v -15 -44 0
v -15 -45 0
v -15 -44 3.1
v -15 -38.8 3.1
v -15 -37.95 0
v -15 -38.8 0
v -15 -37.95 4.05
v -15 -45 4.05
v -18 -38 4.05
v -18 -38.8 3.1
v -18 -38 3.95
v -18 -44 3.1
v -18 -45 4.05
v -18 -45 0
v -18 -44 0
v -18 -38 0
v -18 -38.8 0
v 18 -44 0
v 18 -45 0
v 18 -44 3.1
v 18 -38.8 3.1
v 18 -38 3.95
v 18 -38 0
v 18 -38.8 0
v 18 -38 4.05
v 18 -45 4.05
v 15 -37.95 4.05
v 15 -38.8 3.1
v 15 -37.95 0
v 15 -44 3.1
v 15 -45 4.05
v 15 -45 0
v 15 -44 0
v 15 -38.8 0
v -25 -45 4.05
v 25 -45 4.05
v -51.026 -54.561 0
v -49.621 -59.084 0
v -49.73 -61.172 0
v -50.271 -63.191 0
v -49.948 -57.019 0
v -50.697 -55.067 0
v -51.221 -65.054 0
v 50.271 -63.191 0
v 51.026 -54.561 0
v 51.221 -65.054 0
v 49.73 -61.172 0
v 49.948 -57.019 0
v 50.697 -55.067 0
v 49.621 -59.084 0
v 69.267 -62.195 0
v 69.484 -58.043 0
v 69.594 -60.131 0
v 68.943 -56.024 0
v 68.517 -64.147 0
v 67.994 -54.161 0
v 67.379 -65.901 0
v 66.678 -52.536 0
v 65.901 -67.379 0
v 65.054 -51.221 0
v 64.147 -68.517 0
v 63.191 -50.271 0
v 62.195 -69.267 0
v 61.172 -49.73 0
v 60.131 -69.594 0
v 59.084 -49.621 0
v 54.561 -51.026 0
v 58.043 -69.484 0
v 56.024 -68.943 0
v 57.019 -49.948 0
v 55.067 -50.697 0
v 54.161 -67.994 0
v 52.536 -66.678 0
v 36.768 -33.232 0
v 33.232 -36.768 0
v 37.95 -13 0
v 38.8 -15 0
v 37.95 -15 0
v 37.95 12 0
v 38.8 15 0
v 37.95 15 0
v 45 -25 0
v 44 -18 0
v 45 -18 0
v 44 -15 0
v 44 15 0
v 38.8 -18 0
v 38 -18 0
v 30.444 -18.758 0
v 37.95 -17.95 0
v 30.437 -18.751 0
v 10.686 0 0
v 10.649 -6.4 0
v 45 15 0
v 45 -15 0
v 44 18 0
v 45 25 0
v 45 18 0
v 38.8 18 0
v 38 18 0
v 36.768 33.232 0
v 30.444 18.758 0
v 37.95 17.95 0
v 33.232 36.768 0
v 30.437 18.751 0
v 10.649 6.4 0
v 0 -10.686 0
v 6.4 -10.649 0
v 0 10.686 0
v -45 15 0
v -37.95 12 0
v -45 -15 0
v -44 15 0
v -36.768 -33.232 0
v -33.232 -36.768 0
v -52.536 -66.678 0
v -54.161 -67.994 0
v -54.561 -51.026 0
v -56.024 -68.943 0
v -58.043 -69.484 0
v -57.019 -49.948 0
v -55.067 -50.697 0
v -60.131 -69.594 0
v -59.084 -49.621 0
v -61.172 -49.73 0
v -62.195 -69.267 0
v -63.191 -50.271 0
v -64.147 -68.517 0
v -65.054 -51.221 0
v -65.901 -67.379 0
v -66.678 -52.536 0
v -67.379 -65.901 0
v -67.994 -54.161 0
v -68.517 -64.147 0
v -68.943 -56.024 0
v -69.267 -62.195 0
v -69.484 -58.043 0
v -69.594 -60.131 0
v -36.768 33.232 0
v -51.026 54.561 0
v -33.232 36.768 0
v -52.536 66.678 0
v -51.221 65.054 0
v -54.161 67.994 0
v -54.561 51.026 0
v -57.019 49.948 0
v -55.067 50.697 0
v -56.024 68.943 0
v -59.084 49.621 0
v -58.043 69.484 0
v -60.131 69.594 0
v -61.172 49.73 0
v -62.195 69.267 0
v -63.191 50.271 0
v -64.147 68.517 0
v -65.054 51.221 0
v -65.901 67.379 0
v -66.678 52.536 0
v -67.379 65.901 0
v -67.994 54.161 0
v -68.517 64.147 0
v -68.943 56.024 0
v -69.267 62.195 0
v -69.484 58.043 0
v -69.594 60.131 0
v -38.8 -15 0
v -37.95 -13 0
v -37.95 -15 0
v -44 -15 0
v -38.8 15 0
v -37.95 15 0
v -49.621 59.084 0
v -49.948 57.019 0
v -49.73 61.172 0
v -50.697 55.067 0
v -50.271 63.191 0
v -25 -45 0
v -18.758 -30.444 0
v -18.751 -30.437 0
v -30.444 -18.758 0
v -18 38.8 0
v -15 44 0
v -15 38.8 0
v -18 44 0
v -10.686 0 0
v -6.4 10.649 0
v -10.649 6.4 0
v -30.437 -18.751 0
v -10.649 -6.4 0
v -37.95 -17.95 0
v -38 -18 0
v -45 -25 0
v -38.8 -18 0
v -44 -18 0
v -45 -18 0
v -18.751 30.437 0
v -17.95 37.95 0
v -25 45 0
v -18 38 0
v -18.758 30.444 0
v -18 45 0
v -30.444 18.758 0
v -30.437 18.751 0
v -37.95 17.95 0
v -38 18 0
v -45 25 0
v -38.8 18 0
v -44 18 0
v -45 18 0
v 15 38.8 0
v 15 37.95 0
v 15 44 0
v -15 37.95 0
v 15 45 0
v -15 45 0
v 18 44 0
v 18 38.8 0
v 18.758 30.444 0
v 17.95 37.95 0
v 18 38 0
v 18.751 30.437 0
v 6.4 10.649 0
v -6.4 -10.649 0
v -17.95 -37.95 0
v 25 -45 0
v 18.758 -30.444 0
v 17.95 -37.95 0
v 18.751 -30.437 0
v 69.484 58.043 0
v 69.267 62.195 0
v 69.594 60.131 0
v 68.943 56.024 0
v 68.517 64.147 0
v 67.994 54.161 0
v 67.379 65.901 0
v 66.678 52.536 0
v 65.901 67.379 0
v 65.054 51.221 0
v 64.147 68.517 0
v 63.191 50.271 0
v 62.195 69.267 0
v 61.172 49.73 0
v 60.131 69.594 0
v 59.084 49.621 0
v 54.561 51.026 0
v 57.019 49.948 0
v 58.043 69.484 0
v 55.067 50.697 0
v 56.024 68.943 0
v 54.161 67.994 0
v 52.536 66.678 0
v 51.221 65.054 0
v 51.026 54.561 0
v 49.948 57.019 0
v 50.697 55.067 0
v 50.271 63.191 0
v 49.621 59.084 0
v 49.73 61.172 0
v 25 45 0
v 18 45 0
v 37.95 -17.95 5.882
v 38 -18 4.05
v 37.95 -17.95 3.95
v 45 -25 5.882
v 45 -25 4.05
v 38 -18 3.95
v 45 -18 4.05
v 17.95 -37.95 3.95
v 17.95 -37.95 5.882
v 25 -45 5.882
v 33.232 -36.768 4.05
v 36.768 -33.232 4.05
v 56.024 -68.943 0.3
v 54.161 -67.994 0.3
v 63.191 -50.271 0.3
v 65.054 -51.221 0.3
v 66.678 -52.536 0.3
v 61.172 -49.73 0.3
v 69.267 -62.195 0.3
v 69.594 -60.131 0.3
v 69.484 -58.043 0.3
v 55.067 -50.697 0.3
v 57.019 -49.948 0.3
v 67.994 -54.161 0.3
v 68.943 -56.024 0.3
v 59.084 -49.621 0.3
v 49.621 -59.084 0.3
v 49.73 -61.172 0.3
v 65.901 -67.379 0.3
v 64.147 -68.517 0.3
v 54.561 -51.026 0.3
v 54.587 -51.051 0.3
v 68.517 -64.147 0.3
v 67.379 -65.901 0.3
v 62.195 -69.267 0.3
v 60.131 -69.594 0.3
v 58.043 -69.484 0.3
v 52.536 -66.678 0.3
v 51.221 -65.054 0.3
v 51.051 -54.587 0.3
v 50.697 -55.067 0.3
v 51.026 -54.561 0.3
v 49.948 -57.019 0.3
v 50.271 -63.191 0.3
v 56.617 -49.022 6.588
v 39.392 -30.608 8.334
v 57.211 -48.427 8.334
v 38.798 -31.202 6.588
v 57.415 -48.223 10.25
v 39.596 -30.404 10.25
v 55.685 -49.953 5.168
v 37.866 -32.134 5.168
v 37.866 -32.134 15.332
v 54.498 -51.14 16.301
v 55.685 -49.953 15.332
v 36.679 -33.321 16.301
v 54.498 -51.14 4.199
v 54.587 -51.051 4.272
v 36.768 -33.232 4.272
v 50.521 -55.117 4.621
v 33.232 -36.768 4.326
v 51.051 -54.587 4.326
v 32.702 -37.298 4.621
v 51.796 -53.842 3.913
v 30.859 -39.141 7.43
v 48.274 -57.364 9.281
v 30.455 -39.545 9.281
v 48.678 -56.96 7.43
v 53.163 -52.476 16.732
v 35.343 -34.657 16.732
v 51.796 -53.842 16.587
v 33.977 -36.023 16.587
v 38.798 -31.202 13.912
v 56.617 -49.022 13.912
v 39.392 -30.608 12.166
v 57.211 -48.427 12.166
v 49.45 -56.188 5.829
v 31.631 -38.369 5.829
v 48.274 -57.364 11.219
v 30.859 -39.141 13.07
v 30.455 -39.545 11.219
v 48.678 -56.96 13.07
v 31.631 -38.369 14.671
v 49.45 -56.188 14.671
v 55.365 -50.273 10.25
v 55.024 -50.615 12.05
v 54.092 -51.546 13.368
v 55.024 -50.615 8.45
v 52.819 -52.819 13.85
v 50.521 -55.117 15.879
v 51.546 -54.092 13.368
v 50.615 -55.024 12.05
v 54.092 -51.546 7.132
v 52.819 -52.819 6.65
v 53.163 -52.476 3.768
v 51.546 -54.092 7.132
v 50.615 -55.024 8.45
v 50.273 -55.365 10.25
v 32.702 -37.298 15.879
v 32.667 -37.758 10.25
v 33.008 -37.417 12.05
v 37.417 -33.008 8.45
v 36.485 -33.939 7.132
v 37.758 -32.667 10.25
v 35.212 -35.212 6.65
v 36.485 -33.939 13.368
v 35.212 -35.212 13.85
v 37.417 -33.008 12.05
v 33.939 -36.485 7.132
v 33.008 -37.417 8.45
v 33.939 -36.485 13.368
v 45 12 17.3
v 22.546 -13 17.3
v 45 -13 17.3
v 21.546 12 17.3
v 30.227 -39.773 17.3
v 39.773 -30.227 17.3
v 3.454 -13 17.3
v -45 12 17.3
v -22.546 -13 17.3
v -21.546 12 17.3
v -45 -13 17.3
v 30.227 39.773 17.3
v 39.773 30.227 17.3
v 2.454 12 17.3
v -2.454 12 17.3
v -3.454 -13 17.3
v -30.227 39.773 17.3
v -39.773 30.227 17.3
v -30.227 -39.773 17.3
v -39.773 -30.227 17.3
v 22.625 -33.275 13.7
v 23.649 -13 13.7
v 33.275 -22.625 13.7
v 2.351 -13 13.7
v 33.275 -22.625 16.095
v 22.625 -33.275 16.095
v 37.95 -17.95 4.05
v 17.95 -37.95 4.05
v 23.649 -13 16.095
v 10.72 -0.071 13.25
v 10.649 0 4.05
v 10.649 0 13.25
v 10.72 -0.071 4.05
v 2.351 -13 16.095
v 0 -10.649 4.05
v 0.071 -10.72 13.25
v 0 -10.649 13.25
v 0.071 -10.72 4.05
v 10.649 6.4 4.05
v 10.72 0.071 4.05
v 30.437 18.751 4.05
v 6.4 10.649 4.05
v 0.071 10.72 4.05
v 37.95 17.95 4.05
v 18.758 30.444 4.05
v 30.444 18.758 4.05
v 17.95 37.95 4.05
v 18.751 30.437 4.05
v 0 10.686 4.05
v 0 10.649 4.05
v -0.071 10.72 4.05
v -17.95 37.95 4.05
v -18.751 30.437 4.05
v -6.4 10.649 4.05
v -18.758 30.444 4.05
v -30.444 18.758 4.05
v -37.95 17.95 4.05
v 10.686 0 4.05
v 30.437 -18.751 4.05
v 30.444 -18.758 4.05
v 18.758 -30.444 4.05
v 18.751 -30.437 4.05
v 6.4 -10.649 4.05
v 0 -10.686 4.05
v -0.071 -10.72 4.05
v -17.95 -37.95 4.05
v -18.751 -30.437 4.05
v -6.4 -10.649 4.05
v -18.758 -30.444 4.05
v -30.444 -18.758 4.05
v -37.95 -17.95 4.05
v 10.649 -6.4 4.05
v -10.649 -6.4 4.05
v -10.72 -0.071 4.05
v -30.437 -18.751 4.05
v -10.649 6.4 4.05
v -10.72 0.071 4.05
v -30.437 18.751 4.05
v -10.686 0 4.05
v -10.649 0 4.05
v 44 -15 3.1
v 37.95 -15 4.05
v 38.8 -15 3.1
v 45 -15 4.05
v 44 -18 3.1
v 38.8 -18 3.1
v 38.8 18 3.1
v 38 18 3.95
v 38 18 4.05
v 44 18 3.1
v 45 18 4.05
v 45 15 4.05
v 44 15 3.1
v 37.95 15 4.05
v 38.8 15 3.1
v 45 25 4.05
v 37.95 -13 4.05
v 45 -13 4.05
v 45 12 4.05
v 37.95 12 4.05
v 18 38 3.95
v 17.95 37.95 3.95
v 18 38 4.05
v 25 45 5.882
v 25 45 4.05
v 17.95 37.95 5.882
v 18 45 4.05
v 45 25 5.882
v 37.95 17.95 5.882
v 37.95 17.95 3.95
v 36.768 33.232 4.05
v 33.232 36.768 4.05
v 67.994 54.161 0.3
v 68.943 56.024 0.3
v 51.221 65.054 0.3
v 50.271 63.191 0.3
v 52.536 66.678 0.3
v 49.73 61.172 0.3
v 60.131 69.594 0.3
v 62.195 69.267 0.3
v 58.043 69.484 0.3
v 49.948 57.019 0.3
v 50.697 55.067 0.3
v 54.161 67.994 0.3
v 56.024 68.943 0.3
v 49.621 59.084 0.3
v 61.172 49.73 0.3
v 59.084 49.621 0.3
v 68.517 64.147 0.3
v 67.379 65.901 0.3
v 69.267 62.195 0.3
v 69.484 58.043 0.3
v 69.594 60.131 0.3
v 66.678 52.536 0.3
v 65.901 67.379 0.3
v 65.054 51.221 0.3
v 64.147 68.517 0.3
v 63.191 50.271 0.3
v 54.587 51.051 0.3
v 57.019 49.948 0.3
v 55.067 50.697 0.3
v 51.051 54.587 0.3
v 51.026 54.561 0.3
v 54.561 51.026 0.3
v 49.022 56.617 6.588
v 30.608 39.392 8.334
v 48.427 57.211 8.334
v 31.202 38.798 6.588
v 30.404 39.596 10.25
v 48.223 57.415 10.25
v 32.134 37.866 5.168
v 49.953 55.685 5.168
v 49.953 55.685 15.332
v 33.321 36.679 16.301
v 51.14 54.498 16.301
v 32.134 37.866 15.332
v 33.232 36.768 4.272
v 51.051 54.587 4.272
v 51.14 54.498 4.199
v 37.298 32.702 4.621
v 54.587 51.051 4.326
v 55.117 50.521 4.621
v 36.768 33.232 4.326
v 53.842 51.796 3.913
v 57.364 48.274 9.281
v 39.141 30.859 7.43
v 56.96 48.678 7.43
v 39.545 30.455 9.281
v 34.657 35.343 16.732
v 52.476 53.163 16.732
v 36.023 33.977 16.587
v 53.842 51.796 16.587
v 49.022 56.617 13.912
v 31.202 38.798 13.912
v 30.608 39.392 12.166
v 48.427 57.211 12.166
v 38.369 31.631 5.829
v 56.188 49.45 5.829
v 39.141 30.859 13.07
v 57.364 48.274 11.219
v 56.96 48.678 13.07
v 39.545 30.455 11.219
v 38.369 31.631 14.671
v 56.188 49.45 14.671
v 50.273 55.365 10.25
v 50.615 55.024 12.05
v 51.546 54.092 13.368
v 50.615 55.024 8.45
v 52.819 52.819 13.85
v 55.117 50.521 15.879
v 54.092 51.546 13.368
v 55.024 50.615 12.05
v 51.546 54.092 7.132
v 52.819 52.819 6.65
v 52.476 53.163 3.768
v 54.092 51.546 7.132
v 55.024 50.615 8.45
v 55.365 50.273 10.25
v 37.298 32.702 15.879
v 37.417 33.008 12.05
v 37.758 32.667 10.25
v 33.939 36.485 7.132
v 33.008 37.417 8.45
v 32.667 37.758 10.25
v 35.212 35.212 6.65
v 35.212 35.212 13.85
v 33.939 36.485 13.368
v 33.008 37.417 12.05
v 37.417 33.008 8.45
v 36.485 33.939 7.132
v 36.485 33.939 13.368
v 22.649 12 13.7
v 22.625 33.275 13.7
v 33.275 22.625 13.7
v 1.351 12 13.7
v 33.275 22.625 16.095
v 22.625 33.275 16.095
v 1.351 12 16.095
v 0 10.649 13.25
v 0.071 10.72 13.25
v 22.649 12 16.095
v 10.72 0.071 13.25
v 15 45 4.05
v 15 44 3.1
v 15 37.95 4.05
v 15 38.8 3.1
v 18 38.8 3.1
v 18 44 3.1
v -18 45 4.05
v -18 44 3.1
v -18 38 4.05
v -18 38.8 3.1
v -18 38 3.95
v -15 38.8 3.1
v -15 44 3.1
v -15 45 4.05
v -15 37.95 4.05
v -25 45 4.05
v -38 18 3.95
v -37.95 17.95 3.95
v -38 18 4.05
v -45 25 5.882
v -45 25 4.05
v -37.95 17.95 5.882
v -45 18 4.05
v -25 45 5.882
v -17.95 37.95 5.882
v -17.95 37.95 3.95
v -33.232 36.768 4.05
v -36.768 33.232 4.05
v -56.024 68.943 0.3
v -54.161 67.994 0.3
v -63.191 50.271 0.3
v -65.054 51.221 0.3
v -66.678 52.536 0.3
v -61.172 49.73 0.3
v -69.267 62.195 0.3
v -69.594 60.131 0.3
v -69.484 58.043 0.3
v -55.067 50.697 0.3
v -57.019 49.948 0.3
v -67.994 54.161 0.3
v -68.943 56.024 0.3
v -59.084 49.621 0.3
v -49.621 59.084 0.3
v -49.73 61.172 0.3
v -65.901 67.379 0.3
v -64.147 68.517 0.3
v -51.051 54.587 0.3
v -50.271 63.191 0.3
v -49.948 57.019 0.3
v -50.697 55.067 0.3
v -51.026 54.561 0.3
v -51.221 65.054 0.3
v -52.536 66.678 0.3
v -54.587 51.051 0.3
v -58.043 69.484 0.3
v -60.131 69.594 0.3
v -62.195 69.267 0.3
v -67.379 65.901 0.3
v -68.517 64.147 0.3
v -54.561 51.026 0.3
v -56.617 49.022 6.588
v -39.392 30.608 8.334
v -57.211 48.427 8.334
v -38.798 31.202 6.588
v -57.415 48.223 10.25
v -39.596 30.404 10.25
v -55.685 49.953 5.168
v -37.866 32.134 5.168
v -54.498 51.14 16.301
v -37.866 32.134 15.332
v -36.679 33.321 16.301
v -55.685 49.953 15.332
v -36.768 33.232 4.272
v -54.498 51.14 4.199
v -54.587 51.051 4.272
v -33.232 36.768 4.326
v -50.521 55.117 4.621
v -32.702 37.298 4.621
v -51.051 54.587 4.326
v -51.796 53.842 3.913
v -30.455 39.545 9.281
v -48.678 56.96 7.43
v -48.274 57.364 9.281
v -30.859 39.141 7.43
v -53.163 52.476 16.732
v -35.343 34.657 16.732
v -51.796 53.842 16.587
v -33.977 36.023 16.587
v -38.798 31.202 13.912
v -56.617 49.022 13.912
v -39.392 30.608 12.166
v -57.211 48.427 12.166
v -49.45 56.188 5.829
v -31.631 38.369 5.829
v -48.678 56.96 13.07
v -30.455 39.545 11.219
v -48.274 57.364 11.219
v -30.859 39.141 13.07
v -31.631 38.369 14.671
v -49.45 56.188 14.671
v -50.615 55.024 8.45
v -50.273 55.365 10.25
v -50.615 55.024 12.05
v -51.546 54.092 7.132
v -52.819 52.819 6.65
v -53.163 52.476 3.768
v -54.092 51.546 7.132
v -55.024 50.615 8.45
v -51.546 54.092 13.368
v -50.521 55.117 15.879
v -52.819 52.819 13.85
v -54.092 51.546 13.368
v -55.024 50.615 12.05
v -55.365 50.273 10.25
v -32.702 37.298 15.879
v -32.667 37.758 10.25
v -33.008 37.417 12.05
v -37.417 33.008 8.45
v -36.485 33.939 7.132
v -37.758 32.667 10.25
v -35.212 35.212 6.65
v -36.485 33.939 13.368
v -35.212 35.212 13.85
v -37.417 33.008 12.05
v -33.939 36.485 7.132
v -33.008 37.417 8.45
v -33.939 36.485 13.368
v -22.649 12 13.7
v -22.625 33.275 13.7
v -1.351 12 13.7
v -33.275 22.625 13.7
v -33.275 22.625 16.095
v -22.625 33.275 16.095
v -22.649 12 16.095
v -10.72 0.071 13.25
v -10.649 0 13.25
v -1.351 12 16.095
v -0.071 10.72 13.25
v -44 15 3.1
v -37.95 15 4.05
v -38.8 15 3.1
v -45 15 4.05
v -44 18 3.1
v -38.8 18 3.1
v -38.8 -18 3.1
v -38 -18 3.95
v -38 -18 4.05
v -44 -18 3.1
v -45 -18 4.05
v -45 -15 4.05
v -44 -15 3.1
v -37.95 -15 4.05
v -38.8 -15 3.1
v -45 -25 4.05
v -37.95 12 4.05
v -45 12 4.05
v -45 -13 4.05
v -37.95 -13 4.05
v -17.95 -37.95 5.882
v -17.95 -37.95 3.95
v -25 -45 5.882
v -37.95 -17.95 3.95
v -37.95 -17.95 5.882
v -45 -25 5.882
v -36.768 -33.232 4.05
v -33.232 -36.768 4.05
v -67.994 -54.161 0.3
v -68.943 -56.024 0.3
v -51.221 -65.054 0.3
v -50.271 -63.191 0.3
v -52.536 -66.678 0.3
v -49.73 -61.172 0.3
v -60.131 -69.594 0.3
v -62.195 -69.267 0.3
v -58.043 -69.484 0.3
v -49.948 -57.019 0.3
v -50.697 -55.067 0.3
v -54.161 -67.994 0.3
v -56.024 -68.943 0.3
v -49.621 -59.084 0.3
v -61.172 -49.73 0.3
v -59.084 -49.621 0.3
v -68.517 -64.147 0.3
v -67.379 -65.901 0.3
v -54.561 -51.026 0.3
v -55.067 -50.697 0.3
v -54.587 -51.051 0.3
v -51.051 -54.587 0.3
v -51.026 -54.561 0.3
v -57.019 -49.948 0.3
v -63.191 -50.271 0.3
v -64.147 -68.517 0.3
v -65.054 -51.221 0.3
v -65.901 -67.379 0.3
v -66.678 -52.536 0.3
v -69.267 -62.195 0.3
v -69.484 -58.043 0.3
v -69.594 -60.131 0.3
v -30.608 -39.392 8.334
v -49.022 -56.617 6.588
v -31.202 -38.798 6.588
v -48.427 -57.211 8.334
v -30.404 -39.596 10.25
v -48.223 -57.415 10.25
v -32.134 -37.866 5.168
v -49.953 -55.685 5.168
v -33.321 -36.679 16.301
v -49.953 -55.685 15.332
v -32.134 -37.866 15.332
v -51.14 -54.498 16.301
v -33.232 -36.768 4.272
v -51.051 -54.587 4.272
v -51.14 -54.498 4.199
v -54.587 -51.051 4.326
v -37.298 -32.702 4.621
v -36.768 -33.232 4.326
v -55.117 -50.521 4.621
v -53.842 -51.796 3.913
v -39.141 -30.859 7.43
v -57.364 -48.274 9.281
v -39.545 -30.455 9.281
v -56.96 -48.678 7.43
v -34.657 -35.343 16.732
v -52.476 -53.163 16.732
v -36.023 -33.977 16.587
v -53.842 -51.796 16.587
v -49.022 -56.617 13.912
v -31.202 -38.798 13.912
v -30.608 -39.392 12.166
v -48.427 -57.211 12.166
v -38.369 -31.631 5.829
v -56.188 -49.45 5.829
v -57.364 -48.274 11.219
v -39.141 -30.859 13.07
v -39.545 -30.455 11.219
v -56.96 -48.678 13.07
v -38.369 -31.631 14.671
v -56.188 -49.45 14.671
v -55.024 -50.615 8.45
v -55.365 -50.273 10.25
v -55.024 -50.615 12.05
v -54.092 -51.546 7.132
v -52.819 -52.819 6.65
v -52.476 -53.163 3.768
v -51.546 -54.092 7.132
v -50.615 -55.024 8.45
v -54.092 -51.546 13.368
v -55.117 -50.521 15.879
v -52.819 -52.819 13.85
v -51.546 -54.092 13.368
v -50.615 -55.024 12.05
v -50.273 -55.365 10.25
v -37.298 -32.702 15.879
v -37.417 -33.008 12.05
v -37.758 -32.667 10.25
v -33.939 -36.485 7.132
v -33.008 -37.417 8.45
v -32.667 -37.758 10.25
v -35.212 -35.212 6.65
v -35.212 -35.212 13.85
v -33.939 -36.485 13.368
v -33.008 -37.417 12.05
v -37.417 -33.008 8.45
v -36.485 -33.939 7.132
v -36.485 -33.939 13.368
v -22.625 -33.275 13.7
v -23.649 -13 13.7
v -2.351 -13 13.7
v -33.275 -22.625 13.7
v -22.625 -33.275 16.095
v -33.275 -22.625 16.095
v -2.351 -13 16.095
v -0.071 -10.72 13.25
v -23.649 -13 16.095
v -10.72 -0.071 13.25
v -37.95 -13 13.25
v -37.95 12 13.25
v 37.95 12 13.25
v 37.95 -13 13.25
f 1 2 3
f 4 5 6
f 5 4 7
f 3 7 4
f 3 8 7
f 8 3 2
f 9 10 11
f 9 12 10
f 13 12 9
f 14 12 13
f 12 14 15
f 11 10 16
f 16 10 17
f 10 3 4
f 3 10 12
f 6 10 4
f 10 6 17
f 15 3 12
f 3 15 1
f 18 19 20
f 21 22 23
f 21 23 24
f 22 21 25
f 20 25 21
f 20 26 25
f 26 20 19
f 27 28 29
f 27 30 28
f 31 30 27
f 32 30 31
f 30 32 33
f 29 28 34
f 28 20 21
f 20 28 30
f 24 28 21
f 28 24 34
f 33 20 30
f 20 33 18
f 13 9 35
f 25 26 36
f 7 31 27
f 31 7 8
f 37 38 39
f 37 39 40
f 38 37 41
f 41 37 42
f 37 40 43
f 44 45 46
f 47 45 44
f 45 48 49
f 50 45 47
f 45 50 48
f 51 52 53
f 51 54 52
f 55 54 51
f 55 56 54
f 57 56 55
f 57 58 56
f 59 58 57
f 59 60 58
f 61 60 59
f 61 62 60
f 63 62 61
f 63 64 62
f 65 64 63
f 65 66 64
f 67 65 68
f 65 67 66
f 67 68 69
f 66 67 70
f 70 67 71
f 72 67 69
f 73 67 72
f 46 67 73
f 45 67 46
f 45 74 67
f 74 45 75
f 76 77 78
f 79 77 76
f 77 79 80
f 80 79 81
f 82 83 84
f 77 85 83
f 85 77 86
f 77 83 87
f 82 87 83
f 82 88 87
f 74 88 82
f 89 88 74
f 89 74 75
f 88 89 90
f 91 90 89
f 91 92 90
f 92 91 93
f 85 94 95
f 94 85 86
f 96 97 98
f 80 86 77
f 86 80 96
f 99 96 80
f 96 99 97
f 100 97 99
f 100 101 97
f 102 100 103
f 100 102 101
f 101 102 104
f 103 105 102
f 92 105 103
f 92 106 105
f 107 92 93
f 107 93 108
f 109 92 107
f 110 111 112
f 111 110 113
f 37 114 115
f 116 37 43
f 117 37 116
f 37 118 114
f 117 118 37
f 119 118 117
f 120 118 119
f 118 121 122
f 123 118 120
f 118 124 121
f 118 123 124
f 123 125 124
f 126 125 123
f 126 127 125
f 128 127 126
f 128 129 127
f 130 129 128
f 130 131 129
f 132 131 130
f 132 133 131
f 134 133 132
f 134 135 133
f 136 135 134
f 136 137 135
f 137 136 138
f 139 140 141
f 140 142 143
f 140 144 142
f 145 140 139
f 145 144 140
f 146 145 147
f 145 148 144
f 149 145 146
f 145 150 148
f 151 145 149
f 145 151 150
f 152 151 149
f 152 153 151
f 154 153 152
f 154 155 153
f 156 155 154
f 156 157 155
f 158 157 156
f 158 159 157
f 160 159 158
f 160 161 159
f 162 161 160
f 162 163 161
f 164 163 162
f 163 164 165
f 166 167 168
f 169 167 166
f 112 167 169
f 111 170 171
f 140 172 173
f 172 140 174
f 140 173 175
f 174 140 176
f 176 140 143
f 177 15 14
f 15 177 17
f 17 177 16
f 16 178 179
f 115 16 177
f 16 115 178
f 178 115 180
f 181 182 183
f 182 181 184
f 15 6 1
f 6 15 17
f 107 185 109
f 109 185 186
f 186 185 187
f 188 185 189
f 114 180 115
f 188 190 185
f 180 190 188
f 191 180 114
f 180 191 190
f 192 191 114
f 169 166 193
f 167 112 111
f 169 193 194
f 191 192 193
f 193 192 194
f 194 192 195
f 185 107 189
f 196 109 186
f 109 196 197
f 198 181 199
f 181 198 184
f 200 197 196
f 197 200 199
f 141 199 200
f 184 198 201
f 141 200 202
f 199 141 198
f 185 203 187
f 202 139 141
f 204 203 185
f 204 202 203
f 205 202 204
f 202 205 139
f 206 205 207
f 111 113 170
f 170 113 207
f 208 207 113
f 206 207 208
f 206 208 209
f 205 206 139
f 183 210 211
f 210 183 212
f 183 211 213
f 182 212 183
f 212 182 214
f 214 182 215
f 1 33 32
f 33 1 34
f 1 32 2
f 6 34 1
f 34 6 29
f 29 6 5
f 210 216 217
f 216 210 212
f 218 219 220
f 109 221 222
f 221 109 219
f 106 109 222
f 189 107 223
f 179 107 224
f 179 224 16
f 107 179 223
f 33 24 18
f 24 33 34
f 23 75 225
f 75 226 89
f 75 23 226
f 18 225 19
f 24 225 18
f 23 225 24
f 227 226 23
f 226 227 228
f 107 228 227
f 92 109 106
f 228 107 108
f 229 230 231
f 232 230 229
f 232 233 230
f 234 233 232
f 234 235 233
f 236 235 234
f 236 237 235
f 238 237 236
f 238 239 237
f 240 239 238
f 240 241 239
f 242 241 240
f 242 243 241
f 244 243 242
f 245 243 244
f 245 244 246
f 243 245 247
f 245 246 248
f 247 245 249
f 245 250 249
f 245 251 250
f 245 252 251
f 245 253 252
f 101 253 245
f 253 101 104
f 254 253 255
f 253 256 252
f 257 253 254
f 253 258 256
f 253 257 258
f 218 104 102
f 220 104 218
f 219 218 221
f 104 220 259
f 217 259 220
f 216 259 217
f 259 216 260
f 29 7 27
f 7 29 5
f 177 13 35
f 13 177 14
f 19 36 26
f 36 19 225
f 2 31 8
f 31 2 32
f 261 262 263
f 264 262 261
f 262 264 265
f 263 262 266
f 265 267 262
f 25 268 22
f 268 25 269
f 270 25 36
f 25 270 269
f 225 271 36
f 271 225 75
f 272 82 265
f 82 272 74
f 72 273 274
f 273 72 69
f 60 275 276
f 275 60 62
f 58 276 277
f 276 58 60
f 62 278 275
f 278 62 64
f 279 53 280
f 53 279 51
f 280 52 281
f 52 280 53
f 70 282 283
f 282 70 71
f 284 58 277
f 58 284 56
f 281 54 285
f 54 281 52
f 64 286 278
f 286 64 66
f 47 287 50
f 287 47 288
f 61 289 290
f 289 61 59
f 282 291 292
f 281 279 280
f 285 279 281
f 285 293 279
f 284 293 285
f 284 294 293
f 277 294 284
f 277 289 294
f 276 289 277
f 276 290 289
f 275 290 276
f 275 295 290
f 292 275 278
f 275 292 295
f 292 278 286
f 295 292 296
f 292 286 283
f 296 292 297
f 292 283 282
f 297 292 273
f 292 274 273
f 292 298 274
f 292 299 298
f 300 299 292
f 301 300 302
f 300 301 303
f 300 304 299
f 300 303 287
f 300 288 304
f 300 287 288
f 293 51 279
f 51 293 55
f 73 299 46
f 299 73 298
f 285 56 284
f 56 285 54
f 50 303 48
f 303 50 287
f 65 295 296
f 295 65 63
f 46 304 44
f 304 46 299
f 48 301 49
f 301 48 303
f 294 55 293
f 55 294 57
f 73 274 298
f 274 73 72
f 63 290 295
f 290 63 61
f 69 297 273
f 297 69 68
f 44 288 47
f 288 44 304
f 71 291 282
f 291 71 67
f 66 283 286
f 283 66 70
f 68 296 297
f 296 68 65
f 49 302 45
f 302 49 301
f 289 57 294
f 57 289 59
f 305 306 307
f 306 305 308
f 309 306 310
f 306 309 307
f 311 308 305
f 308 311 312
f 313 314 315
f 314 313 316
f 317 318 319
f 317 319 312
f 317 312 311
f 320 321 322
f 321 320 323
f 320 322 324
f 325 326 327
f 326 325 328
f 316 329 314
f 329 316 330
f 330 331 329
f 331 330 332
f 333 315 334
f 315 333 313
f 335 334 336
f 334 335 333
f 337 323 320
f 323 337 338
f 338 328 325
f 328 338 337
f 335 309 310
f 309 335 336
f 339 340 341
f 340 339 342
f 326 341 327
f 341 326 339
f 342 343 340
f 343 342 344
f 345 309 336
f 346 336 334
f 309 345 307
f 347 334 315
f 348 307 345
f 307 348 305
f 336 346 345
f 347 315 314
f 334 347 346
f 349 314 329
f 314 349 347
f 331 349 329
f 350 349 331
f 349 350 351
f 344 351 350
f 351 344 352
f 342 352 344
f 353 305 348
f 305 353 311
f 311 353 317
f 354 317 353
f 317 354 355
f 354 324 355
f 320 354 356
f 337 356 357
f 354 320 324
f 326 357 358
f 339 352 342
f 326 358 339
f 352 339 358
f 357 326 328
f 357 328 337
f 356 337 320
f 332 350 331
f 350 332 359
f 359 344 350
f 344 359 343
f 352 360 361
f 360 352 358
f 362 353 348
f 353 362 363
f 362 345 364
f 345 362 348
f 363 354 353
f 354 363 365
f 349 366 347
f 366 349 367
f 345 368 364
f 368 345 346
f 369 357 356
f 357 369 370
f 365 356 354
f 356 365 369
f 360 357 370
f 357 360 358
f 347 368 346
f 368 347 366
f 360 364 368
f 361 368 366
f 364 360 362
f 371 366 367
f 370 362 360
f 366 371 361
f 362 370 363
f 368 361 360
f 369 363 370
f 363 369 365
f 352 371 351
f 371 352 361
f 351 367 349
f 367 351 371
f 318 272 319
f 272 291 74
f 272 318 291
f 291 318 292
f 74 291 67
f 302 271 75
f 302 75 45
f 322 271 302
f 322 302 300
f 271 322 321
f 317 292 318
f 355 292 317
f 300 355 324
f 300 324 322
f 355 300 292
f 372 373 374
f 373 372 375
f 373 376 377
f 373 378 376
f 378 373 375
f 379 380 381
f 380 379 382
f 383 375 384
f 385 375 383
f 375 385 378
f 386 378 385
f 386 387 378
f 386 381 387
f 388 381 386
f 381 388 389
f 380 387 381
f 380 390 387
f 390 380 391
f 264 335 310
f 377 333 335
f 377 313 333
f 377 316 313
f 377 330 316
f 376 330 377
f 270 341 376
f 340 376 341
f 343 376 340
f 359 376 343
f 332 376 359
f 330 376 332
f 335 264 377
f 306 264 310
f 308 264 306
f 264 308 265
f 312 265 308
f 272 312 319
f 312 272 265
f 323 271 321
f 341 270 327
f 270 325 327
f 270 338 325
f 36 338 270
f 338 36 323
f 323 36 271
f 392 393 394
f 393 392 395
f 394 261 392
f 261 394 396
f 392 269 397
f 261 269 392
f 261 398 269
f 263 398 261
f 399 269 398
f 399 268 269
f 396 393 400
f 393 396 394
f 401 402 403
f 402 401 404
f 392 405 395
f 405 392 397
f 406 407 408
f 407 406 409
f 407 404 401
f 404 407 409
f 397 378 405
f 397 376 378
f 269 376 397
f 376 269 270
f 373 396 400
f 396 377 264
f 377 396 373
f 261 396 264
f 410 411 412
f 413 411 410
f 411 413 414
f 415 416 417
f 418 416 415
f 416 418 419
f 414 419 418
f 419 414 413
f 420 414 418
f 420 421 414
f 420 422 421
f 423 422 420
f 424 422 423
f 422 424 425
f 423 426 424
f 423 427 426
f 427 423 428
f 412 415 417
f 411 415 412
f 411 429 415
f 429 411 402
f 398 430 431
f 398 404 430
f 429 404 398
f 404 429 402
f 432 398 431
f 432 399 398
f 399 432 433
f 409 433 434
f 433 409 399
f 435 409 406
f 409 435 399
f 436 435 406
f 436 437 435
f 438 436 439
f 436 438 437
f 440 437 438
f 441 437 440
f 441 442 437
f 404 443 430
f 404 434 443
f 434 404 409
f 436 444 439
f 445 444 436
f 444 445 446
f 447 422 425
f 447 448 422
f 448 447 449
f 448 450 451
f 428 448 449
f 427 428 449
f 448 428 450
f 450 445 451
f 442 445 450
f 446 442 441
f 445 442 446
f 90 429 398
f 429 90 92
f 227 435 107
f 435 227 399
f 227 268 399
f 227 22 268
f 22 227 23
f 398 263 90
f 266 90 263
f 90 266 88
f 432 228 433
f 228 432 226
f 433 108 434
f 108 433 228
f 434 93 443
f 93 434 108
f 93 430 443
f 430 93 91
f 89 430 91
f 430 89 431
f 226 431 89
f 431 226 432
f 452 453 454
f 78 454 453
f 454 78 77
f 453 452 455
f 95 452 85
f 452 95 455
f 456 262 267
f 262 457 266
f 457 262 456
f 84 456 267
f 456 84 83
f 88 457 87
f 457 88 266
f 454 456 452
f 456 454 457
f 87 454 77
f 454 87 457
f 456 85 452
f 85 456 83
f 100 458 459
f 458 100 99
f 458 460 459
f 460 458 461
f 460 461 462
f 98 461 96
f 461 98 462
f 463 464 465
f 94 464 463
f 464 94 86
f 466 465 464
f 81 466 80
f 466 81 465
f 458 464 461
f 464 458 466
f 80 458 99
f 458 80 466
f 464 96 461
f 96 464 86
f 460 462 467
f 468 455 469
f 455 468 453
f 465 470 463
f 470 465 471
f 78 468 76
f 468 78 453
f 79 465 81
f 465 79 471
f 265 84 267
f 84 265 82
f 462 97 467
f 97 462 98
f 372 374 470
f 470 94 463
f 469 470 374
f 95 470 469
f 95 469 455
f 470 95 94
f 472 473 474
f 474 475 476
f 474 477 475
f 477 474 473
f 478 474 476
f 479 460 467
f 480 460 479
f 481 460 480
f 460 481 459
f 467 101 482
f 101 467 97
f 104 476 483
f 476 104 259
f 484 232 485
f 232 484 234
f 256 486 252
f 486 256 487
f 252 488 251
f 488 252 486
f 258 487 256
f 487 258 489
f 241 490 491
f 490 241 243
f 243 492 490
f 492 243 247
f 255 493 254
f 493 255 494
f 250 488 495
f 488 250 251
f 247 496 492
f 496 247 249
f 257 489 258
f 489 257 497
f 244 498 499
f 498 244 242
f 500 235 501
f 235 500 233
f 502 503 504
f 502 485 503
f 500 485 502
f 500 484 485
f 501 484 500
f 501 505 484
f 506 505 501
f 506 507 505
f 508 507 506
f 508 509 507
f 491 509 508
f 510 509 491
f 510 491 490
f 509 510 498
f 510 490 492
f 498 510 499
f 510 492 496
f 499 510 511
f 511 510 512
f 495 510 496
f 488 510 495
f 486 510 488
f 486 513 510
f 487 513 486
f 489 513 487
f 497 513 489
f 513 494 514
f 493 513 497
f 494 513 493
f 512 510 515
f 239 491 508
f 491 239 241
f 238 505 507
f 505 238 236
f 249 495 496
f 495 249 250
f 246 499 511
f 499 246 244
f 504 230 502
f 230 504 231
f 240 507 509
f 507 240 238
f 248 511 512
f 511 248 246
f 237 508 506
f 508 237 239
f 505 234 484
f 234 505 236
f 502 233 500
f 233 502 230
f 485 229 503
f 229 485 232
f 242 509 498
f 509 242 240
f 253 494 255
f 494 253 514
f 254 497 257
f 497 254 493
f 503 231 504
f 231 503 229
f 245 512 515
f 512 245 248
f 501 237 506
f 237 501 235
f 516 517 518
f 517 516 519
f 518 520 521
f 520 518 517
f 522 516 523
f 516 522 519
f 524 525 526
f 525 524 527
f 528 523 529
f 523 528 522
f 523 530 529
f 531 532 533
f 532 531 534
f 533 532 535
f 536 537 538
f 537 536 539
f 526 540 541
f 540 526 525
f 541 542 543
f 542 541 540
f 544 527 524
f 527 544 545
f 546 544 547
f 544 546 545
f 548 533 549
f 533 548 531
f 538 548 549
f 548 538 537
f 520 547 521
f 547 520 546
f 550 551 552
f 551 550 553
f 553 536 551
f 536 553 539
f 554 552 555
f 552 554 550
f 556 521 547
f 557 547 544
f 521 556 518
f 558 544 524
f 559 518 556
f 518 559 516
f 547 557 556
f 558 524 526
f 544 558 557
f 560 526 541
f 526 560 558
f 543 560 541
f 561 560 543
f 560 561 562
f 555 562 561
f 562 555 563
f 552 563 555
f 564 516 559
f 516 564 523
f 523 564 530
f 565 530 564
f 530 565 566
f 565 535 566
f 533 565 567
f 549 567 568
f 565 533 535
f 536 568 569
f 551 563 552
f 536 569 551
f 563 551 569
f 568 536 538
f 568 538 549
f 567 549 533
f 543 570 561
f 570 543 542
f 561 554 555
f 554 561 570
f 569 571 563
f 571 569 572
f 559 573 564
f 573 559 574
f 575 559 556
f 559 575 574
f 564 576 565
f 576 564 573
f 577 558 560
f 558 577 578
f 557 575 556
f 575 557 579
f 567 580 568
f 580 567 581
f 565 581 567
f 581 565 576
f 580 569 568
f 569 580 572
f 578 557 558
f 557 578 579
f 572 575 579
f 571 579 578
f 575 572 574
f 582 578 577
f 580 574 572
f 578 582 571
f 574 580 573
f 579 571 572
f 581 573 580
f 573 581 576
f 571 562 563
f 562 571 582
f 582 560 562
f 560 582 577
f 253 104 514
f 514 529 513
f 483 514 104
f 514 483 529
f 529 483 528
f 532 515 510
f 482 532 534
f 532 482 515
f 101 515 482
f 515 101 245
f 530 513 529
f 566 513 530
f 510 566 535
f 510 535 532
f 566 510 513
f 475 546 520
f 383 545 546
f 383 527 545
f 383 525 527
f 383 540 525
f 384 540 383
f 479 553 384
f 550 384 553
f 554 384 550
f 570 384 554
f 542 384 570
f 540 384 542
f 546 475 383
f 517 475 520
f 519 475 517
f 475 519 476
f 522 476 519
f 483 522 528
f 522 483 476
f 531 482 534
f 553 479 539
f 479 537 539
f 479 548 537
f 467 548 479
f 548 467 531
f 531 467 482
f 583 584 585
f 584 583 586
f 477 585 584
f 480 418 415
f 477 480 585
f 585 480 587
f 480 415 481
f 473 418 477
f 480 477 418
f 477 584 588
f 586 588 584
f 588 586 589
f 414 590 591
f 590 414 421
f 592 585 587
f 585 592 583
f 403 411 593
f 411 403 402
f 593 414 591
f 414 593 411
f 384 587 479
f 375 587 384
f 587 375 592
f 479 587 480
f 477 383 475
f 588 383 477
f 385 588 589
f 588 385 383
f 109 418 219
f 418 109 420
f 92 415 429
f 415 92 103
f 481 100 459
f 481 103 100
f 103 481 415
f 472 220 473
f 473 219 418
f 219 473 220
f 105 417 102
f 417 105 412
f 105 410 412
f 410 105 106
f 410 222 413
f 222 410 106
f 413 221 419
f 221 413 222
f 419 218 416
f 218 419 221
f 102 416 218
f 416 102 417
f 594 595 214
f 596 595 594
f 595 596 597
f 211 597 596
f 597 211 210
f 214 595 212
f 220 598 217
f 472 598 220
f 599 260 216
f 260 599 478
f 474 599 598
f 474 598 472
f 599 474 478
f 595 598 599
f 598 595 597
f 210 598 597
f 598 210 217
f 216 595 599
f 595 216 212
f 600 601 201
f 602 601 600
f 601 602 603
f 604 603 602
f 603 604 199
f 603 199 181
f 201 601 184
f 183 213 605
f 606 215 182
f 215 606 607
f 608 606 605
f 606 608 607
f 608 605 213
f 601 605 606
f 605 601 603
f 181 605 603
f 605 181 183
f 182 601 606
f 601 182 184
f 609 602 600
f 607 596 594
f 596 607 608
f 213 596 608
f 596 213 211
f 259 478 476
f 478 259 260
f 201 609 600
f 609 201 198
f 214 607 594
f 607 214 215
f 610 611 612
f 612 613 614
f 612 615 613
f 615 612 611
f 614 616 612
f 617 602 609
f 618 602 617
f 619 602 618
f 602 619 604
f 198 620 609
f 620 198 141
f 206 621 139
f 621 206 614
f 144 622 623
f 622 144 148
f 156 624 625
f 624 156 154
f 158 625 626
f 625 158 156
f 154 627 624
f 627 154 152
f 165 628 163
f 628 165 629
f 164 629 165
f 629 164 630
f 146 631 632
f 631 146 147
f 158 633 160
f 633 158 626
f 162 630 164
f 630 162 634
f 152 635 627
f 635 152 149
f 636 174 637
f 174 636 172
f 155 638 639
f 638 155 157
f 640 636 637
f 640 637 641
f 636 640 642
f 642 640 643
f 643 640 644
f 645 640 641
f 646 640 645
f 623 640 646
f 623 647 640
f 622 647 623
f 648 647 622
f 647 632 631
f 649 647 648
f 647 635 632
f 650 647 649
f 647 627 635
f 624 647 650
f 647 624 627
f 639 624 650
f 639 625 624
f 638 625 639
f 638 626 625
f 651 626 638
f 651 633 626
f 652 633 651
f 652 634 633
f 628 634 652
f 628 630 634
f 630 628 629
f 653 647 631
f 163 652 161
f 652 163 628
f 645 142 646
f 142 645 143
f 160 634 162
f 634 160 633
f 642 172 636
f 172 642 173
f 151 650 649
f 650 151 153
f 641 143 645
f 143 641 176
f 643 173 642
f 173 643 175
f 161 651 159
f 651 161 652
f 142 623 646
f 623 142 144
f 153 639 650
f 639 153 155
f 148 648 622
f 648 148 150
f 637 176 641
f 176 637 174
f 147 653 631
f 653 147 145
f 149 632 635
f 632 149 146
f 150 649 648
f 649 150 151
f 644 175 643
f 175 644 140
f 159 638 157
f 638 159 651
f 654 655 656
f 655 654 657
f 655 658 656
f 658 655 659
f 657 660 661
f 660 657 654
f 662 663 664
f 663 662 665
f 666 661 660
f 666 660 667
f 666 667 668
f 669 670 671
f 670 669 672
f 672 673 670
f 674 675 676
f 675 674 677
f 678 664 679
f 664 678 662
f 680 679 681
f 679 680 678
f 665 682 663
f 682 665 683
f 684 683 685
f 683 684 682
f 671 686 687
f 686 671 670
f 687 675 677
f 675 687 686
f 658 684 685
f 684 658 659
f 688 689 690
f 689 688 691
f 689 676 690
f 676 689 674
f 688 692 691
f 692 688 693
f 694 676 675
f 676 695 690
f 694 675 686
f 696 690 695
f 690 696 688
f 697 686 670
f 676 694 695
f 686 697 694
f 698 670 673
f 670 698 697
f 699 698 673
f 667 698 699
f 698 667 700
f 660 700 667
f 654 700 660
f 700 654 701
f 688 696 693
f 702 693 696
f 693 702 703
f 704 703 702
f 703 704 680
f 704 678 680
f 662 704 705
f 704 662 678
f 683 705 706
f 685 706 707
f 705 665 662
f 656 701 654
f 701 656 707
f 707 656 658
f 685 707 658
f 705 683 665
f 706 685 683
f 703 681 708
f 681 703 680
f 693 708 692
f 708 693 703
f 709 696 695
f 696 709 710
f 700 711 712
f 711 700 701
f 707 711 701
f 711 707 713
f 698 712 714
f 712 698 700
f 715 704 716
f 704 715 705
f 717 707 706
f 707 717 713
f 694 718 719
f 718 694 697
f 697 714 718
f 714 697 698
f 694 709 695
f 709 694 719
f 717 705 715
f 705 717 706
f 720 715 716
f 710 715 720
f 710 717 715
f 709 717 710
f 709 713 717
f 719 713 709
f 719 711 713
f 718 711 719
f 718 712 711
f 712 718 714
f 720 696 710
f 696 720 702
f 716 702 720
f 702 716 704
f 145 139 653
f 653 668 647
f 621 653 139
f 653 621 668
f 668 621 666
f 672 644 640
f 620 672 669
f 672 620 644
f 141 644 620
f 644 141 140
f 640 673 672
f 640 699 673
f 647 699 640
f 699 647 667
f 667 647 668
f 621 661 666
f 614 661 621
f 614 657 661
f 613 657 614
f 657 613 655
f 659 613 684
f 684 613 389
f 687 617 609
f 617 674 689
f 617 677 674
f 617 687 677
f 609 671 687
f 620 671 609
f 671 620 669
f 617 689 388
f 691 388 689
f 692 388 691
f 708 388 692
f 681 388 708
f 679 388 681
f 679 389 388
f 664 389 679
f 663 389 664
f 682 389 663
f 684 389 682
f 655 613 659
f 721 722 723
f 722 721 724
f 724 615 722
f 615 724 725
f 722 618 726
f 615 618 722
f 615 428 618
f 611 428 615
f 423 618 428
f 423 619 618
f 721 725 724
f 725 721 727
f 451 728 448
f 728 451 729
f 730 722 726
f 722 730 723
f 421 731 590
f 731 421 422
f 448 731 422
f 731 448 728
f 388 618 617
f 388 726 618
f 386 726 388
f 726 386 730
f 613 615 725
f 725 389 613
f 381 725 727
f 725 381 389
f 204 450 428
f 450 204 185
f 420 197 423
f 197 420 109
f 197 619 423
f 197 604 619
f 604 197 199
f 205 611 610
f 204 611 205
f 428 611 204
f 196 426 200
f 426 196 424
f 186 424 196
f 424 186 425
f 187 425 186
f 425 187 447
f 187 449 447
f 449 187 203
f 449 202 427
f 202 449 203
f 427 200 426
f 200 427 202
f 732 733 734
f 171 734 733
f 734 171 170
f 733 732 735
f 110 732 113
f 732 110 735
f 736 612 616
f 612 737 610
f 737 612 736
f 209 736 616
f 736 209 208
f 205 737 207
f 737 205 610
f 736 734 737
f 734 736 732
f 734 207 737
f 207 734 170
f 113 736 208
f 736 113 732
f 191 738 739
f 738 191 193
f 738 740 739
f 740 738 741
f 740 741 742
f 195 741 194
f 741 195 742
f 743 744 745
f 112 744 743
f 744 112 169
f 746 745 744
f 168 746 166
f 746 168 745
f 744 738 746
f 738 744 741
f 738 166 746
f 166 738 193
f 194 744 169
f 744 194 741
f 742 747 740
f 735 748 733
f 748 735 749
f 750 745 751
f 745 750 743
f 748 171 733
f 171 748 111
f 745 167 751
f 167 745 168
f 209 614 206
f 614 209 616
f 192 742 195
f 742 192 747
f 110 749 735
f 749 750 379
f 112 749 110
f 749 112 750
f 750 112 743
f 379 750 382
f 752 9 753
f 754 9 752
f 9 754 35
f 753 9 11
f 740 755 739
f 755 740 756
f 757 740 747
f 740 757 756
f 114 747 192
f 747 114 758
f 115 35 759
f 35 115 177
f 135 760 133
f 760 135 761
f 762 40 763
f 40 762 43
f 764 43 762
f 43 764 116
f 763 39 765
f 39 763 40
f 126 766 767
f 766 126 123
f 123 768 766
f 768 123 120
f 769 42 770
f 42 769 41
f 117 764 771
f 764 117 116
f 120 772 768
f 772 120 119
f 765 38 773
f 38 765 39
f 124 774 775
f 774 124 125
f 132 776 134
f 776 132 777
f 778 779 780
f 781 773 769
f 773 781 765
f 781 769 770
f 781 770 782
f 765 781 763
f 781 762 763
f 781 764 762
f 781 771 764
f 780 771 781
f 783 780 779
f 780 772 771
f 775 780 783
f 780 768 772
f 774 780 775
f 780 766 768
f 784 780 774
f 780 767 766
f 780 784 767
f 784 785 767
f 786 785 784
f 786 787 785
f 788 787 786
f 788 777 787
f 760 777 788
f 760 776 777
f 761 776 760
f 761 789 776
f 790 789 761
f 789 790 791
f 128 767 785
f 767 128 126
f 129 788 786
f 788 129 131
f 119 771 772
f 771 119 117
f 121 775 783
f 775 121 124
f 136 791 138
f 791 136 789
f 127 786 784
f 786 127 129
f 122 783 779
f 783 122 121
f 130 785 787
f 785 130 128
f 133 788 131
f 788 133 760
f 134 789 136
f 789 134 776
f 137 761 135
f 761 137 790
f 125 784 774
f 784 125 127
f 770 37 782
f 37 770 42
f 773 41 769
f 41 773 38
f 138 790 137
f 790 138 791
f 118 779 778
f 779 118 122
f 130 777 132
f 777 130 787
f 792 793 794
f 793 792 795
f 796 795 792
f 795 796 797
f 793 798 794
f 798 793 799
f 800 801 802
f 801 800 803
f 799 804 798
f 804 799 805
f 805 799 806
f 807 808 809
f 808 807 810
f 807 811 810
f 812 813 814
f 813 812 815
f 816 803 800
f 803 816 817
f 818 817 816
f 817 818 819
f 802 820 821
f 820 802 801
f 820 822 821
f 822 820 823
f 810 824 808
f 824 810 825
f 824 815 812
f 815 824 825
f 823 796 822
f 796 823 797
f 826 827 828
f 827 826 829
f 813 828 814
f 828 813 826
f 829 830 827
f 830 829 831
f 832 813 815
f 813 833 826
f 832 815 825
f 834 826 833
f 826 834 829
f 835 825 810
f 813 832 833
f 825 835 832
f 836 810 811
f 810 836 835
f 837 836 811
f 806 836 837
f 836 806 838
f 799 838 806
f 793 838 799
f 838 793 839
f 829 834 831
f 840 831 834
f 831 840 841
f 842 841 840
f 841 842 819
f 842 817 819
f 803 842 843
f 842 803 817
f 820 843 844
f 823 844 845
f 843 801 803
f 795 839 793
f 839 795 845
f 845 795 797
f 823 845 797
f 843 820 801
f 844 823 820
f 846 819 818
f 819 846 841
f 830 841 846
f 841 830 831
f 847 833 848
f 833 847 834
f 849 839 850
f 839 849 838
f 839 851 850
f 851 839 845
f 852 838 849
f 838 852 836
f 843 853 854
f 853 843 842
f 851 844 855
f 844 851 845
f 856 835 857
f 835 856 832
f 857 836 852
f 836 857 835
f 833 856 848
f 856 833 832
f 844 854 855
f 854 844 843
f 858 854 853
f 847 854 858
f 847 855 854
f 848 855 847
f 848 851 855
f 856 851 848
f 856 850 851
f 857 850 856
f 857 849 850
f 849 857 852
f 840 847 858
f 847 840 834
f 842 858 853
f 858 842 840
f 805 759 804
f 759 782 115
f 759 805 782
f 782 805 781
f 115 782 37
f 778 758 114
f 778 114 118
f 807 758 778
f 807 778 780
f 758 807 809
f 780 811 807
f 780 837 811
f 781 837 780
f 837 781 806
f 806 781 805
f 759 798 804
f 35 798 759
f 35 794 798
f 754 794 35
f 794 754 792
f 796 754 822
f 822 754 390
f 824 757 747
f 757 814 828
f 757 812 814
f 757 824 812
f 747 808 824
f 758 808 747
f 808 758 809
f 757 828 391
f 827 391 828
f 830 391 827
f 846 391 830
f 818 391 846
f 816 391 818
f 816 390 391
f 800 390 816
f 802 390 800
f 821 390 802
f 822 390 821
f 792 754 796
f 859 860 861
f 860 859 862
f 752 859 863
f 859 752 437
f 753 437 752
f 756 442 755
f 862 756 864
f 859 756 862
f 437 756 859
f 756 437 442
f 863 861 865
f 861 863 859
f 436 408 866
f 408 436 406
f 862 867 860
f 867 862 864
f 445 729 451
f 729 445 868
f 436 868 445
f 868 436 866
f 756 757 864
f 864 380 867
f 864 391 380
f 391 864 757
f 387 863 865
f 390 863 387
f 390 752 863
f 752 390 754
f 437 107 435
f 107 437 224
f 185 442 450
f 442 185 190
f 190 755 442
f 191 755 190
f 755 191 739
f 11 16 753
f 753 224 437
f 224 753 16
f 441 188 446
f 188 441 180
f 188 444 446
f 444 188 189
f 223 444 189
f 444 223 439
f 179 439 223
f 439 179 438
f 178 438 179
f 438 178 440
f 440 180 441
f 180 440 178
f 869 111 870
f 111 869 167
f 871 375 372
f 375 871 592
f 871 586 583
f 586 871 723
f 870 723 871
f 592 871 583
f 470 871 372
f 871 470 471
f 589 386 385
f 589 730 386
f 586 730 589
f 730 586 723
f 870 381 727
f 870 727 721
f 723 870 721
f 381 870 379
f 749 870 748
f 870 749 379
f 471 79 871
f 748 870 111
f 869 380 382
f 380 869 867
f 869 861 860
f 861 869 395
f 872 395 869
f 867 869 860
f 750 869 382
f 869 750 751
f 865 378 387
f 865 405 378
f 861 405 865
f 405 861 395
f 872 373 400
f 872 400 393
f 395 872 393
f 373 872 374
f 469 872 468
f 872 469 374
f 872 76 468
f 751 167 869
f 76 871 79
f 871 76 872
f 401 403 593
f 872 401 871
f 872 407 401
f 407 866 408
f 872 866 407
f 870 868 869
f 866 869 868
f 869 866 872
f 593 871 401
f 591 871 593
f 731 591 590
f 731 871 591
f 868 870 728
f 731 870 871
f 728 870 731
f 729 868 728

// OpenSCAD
// file: chassis.scad
include <plsq.scad>

/**
 * PLSQ inner frame
 *
 * The child of this module will be made at each corner. Ex:
 *
 * chassis()
 * union() {
 *     // Stuff at corners
 *     ...
 * }
 *
 * @param rafts Wether or not to make rafts at the corners
 */
module chassis(rafts = true) {
	for(i = [0 : 45 : 360 - 45]) {
		rotate([0, 0, i]) {
			if(i % 90 == 0) {
				translate([-ch_short_l / 2, -ch_full_l / 2, 0]) {
					difference() {
						cube([ch_short_l, ch_90_th, ch_full_h]);

						// Cutouts
						for(j = [0 : 1]) {
							translate([j == 0 ? (ch_cutout_ratio * ch_short_l) :
							         ((1 - ch_cutout_ratio) * ch_short_l -
							         ch_cutout_w),
							         debug ? -0.1 : 0, debug ? -0.1 : 0])
							difference() {
								cube([ch_cutout_w, ch_90_th + (debug ? 0.2 : 0), ch_full_h + (debug ? 0.2 : 0)]);
								translate([debug ? -0.1 : 0, ch_cutout_front_th, debug ? -0.1 : 0]) {
									cube([ch_cutout_w + (debug ? 0.2 : 0), ch_90_th - ch_cutout_front_th - ch_cutout_back_th, ch_full_h - ch_cutout_th]);
								}
							}
						}
					}
				}
			}
			else { // i % 45 == 0
				translate([0, -ch_45_diag + ch_45_l / 2, 0]) {
					translate([-ch_45_l / 2, 0, 0]) {
						cube([ch_45_l, ch_45_th, ch_full_h]);
					}
					if(rafts) {
						translate([0, -l_leg_l - l_raft_r + 0.2, 0]) {
							cylinder(h = th, r = l_raft_r);
						}
					}
				}

				child();
			}
		}
	}
}
// file: plsq.scad
/**
 * PLSQ Leshy
 *
 * @id plsq-leshy
 * @root
 * @name PLSQ Leshy
 * @using 1 glue
 * @using 4 plsq-arm
 * @using 4 plsq-motor-mount
 * @using 1 plsq-camera-holder
 * @using 1 plsq-camera-mount
 * @using 1 plsq-canopy
 * @using 1 plsq-body
 * @using 1 plsq-legs
 */

/********************
 * Global variables *
 *******************/
debug = true;
th = 0.3;
// Amount of space to leave between press-fit parts
tolerance = 0.25;

/**************************************
 * Arm measurements, prefixed with a_ *
 *************************************/
a_raft_r = 30.6;
a_overlap = 20;
a_short_h = 4;
a_short_r = 12.6;
a_tall_h = 140;
a_tall_r = 8.75;
a_tall_th = 2;
a_slot_w = 5.5;
a_slot_lower_h = 25.48;
a_slot_upper_h = 22;
a_coupler_h = 30;

/*******************************************
 * Chassis measurements, prefixed with ch_ *
 *******************************************/
ch_full_l = 90;
ch_45_l = 2 * a_short_r + 3.0843;
ch_short_l = ch_full_l - 2 * cos(45) * ch_45_l;
ch_90_th = 7.05;
ch_45_th = 6.51;
ch_45_diag = (ch_full_l / 2) / cos(45);
ch_full_h = 4.05; // height of a chassis layer
ch_cutout_w = 3;
ch_cutout_th = 0.75;
ch_cutout_front_th = 1.1;
ch_cutout_back_th = 0.75;
ch_cutout_ratio = 0.14;

/***************************************
 * Body measurements, prefixed with b_ *
 **************************************/
b_h = 2 * a_short_r - (a_short_r - a_tall_r) - ch_full_h;
b_beam_h = 3.6;
b_beam_w = 2 * a_tall_r - 2 * a_tall_th;
b_beam_trim = 0.78;
b_arm_r = a_tall_r - a_tall_th - tolerance;
b_arm_th = 2.9;
b_beam_cyl_h = 3;
b_beam_cyl_r = 3.01;
b_beam_cyl_th = 1.5;
b_beam_cyl_place = 0.6815 * (ch_45_diag - ch_45_l / 2 - b_beam_w);

/*****************************************
 * Canopy measurements, prefixed with c_ *
 ****************************************/
c_45_l = 2 * a_short_r + 2;
// Lengths of sides of different cross-sections
c_bottom_l = ch_full_l + 8.5;
c_middle_l = 0.9877 * c_bottom_l;
c_top_l = 0.5707 * c_bottom_l;
// Heights of different sections
c_bottom_h = 2 * a_tall_r + 14.1;
c_top_h = 0.519 * c_bottom_h;
// Thickness of the canopy walls
c_th = 2;
// Window dimensions
c_window_w = 2 * (a_tall_r + 0.45);
c_window_h = b_h + 5.63;
// Width of the receiver bay
c_receiver_w = 12;
c_receiver_angle = 20;
c_text = "Leshy";

/**************************************
 * Leg measurements, prefixed with l_ *
 *************************************/
l_leg_l = 25;
l_leg_th = a_slot_w - 0.5;
l_cam_h = 70;
l_h = 50;
l_raft_r = 10;
l_strip_ratio = 0.5;
l_camera_strip_offset = 2.6;
l_camera_thin_th = 7.45;
l_camera_thick_th = 18.6;
l_camera_thick_ratio = 0.622;

/***********************************************
 * Motor mount measurements, prefixed with mm_ *
 ***********************************************/
mm_open_l = 32;
mm_open_pad1 = 2;
mm_open_pad2 = 3.4;
mm_arm_l = a_slot_upper_h - 1 + mm_open_l + mm_open_pad1 + mm_open_pad2;
mm_arm_half1 = 0.61 * mm_arm_l;
mm_raft_r = 10;
mm_arm_short_r = a_tall_r - a_tall_th - tolerance;
mm_arm_th = 3;
mm_arm_tall_th = 2.4;
mm_arm_tall_r = a_tall_r;
mm_arm_runner = a_slot_w - 2 * tolerance;
mm_cup_base_h = 5;
mm_cup_h1 = 15;
mm_cup_h2 = mm_cup_h1 + mm_cup_base_h + 3;
mm_cup_r1 = 18;
mm_cup_r2 = mm_cup_r1 - 2;
mm_cup_r3 = mm_cup_r2 + 2 * tolerance;
mm_cup_th = 1;
// cup depression
mm_cup_dep_r1 = 4.1;
mm_cup_dep_r2 = 4.53;
mm_cup_dep_h = 3;
mm_cup_hole_h1 = 2.2;
mm_cup_hole_h2 = 0.5;
mm_cup_hole_r1 = 3.1;
mm_cup_hole_r2 = 1.68;

/*************************************************
 * Camera holder measurements, prefixed with camh_ *
 ************************************************/
camh_h1 = 13;
camh_h2 = 14;
camh_w = ch_short_l - 2 * ch_cutout_ratio * ch_short_l -
      2 * ch_cutout_w - 0.15;
camh_th = 0.65;
camh_pad1 = 1.5;
camh_pad2 = 2;
// tapered section
camh_tap_sec_l = 0.26 * (ch_full_l / 2 - l_camera_thick_th -
                 ch_90_th);
camh_tap_angle = 32;
// chassis section
camh_camh_sec_l = ch_90_th + 2 * camh_th + 0.2;
camh_camh_sec_h = camh_h2 - 2.5;
// canopy section
camh_can_sec_l = 4;
camh_can_sec_h = 3;
// Hinges
camh_hinge1_r1 = 5;
camh_hinge1_r2 = 3.9;
camh_hinge1_r3 = 1.5;
camh_hinge1_w = 8.5;
camh_hinge1_off = 2;
camh_hinge2_r1 = 3;
camh_hinge2_r2 = 2.32;
camh_hinge2_r3 = 0.5;
camh_hinge2_w = 2.5;
camh_hinge2_off = 1.4;
camh_l = camh_tap_sec_l + camh_pad1 + camh_pad2 +
         camh_camh_sec_l + camh_can_sec_l;

/************************************************
 * Camera mount measurements, prefixed with cm_ *
 ***********************************************/
cm_w = 65;
cm_l = 35;
cm_h = 43.9;
cm_th = 2;
cm_hinge_off = 1.5;
cm_hinge_w = 11;
cm_hinge_h = 11;
cm_hinge_r1 = 3.475;
cm_hinge_r2 = 1.425;
cm_h_w = 9;
cm_h_h = 33;
cm_h_l = 14;
cm_h_r = 4.3;
cm_h_th = 1.5;
cm_h_r2 = 1;
// main file
include <plsq.scad>
include <chassis.scad>

/**
 * PLSQ Body
 *
 * The part where all the guts (and brains) go.
 *
 * @id plsq-body
 * @name PLSQ Body
 * @category Printed
 * @using multiwii-se
 * @param bool rafts Whether to make the rafts
 */
module body(rafts = true) {
	assign(adj = cos(45) * ch_45_th)
	assign(c = ch_45_l - 2 * ((ch_90_th - adj) / cos(45)))
	assign(corner_l = cos(45) * c)
	assign(center_l = b_beam_w + 2 * b_beam_trim)
	assign(th  = 0.16 * ch_45_l)
	assign(side = cos(45) * ch_90_th)
	chassis(rafts = rafts) {
		union() {
			// Arm connectors
			assign(r_th = a_slot_w - 0.5)
			assign(zneg = 0.55) {
				translate([-r_th / 2, -ch_45_diag + ch_45_l / 2 - l_leg_l - 0.2, 0]) { 
                    cube([r_th, l_leg_l + 0.3, b_h - 2 * b_arm_r - zneg + b_arm_th / 2]);
				}
				translate([0, -ch_45_diag + ch_45_l / 2 - l_leg_l - 0.2, b_h - zneg - b_arm_r])
				rotate([-90, 0, 0])
				difference() {
					cylinder(h = l_leg_l + 0.3, r = b_arm_r);
					translate([0, 0, -0.1]) {
						cylinder(h = l_leg_l, r = b_arm_r - b_arm_th);
					}
				}
			}
			difference() {
				union() {
					// Center cube
					translate([-center_l / 2, -center_l / 2 - 0.1, 0]) {
						cube([center_l, center_l / 2 + 0.2, b_h]);
					}

					// Cross beam
					difference() {
						translate([-ch_45_l / 2, -ch_45_diag + ch_45_l / 2, ch_full_h - 0.1]) {
						    cube([ch_45_l, ch_45_diag - ch_45_l / 2 - center_l / 2 + 0.1, b_h - ch_full_h + 0.1]); 
                        }
						translate([-ch_45_l / 2 - 0.1, -ch_45_diag + ch_45_l / 2 + 2 * side, ch_full_h - 0.2]) {
							cube([ch_45_l + 0.2, ch_45_diag - ch_45_l / 2 - 2 * side - center_l / 2 + 1, b_h - b_beam_h - ch_full_h + 0.2]);
						}
					}
				}
				assign(b_h2 = 0.34 * b_h)
				assign(o = (b_h - b_h2))
				assign(a = (ch_45_l / 2 - b_beam_w / 2))
				assign(angle = atan(o / a))
				assign(l = sqrt(pow(o, 2) + pow(a, 2)))
				assign(h = sin(angle) * a)
				for(i = [0 : 1]) {
					assign(sign = (i == 0 ? -1 : 1))
					translate([sign * b_beam_w / 2, -ch_45_diag + ch_45_l / 2 - 0.1, b_h])
					rotate([0, sign * angle, 0]) 
					translate([i == 0 ? -l : 0, 0, 0]) {
						cube([l, ch_45_diag - ch_45_l / 2 - b_beam_w / 2 + 0.1, h]);
					}
					assign(sign = (i == 0 ? -1 : 1))
					translate([i == 0 ? (-ch_45_l / 2) : (b_beam_w / 2 +
					         b_beam_trim), -ch_45_diag + ch_45_l / 2 + 2 *
					         side, ch_full_h]) {
						cube([(ch_45_l - b_beam_w) / 2 -
						    (i == 0 ? b_beam_trim : 0), ch_45_diag -
						    ch_45_l / 2 - 2 * side - center_l / 2 + 0.2, 
						    b_h - b_beam_h]);
					}
				}
			}

			// Lower beams
			linear_extrude(height = ch_full_h) {
				difference() {
					hull() {
						translate([-ch_45_l / 2, -ch_45_diag + ch_45_l / 2 + ch_45_th - 0.1]) {
							square([ch_45_l, 2 * side - ch_45_th + 0.1]);
						}
						translate([-center_l / 2, -center_l / 2 - th + 0.1]) {
							square([center_l, th]);
						}
					}
					hull() {
						assign(angle = atan((ch_45_diag - ch_45_l / 2) / (ch_45_l / 2)))
						assign(factor = 0.95)
						assign(side2 = (factor * side) / tan(angle))
						translate([-ch_45_l / 2 + th + side2, -ch_45_diag + ch_45_l / 2 + 2 * side + factor * side]) {
							square([ch_45_l - 2 * (th + side2), 0.01]);
						}
						translate([-center_l / 2 + th, -center_l / 2 - 2 * th]) {
							square([center_l - 2 * th, th]);
						}
					}
				}
			}
		}
	}

    // additional structure to mount APM

    // mounting plate
    translate([-ch_full_l / 2, -13, b_h - ch_full_h]){
        cube([ch_full_l, l_strip_ratio * ch_short_l, ch_full_h]);
    }
    // support blocks
    for (i = [-ch_full_l / 2, ch_full_l/2 - ch_90_th]){
        translate([i, -13, 0]){
            cube([ch_90_th, l_strip_ratio * ch_short_l, b_h]);
        }
    }

}

body();
